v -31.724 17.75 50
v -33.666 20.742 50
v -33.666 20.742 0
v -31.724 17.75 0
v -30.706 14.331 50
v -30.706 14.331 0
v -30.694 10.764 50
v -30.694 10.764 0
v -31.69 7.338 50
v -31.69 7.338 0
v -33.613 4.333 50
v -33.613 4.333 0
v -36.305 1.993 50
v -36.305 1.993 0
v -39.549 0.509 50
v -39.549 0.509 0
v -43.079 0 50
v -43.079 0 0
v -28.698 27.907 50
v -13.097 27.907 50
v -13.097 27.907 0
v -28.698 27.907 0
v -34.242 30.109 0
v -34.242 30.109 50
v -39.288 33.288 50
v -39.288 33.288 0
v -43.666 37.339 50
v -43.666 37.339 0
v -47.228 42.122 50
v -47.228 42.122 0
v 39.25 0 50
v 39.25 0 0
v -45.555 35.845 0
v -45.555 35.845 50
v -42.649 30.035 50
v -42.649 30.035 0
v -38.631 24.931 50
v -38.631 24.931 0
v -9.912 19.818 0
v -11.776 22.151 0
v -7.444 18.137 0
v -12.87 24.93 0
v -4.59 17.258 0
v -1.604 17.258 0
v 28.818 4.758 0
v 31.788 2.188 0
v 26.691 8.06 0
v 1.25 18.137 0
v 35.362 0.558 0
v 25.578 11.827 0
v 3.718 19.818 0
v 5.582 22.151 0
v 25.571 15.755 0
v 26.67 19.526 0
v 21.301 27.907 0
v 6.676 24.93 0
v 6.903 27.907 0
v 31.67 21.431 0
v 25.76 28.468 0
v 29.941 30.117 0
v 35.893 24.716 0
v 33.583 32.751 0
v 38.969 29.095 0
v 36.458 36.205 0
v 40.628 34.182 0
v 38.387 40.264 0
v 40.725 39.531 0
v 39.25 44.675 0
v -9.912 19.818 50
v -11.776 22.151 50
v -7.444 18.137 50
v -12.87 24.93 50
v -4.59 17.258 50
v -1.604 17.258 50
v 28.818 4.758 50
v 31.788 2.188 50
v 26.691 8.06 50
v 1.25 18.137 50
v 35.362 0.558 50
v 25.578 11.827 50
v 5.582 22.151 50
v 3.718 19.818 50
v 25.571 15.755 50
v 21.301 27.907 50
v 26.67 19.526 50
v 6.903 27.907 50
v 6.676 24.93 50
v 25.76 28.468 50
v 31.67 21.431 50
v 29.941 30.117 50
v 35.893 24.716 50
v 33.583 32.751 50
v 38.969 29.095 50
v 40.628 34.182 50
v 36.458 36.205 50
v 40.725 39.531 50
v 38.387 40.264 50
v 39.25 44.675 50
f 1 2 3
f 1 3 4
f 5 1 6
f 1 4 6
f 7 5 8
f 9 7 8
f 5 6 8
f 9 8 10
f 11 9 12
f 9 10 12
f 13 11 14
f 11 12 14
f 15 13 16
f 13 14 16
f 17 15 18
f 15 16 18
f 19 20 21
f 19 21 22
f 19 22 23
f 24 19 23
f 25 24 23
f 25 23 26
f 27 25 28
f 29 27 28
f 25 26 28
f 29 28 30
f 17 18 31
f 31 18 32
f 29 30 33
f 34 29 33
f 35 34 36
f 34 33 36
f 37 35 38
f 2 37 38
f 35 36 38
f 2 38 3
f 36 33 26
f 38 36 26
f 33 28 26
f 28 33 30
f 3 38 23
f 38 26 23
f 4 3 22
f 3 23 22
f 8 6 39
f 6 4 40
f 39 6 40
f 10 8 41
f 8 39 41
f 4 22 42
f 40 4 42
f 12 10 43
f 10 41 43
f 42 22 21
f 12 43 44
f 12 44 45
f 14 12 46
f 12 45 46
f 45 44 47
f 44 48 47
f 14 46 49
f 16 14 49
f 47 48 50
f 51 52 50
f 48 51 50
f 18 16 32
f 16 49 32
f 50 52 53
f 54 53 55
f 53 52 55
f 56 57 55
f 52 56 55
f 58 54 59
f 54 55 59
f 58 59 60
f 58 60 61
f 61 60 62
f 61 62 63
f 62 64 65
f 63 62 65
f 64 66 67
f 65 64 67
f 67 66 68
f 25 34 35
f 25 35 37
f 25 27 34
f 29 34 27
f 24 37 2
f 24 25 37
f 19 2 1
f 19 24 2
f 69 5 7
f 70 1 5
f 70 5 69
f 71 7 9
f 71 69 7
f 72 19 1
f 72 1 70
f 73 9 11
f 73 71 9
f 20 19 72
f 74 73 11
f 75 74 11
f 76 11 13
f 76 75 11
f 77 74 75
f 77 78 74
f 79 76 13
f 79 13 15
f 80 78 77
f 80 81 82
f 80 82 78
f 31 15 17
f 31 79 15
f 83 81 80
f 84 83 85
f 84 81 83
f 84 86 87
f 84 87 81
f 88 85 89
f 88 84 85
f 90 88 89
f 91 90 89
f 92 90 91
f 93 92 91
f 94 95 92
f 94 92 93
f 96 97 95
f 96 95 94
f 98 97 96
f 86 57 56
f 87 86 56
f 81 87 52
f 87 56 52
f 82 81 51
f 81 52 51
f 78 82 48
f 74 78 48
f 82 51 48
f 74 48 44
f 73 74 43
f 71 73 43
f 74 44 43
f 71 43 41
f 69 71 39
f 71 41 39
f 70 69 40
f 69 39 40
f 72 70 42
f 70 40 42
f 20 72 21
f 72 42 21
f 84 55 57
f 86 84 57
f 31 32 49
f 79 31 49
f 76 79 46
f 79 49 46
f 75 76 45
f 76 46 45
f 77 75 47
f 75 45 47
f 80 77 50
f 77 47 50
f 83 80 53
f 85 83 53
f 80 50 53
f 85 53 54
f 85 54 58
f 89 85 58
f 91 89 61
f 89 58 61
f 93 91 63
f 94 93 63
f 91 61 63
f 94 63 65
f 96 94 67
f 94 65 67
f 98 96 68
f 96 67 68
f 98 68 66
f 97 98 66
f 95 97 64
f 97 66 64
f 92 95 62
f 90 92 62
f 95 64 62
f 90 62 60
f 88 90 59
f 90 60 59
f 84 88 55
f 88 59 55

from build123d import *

# Parameters (mm, degrees)
F1_DEPTH = 49.9999


with BuildPart() as f1:
    # F0 (on Top) → F1 (new body)
    with BuildSketch(Plane.XY):
        with BuildLine():
            ThreePointArc((-33.665815, 20.741972), (-31.690377, 7.338264), (-43.079478, 0))
            Line((-43.079478, 0), (-24.252152, 0))
            Line((-24.252152, 0), (39.250193, 0))
            ThreePointArc((39.250193, 0), (27.63624, 6.333119), (26.670001, 19.526249))
            ThreePointArc((26.670001, 19.526249), (38.969207, 29.094689), (39.250193, 44.675015))
            ThreePointArc((39.250193, 44.675015), (33.582753, 32.751227), (21.301444, 27.90705))
            Line((21.301444, 27.90705), (6.903135, 27.90705))
            ThreePointArc((6.903135, 27.90705), (-3.09687, 17.145785), (-13.096876, 27.90705))
            Line((-13.096876, 27.90705), (-28.698456, 27.90705))
            ThreePointArc((-28.698456, 27.90705), (-39.287504, 33.288324), (-47.227875, 42.122154))
            ThreePointArc((-47.227875, 42.122154), (-42.649199, 30.035047), (-33.665815, 20.741972))
        make_face()
    extrude(amount=F1_DEPTH)


solid = f1.part
